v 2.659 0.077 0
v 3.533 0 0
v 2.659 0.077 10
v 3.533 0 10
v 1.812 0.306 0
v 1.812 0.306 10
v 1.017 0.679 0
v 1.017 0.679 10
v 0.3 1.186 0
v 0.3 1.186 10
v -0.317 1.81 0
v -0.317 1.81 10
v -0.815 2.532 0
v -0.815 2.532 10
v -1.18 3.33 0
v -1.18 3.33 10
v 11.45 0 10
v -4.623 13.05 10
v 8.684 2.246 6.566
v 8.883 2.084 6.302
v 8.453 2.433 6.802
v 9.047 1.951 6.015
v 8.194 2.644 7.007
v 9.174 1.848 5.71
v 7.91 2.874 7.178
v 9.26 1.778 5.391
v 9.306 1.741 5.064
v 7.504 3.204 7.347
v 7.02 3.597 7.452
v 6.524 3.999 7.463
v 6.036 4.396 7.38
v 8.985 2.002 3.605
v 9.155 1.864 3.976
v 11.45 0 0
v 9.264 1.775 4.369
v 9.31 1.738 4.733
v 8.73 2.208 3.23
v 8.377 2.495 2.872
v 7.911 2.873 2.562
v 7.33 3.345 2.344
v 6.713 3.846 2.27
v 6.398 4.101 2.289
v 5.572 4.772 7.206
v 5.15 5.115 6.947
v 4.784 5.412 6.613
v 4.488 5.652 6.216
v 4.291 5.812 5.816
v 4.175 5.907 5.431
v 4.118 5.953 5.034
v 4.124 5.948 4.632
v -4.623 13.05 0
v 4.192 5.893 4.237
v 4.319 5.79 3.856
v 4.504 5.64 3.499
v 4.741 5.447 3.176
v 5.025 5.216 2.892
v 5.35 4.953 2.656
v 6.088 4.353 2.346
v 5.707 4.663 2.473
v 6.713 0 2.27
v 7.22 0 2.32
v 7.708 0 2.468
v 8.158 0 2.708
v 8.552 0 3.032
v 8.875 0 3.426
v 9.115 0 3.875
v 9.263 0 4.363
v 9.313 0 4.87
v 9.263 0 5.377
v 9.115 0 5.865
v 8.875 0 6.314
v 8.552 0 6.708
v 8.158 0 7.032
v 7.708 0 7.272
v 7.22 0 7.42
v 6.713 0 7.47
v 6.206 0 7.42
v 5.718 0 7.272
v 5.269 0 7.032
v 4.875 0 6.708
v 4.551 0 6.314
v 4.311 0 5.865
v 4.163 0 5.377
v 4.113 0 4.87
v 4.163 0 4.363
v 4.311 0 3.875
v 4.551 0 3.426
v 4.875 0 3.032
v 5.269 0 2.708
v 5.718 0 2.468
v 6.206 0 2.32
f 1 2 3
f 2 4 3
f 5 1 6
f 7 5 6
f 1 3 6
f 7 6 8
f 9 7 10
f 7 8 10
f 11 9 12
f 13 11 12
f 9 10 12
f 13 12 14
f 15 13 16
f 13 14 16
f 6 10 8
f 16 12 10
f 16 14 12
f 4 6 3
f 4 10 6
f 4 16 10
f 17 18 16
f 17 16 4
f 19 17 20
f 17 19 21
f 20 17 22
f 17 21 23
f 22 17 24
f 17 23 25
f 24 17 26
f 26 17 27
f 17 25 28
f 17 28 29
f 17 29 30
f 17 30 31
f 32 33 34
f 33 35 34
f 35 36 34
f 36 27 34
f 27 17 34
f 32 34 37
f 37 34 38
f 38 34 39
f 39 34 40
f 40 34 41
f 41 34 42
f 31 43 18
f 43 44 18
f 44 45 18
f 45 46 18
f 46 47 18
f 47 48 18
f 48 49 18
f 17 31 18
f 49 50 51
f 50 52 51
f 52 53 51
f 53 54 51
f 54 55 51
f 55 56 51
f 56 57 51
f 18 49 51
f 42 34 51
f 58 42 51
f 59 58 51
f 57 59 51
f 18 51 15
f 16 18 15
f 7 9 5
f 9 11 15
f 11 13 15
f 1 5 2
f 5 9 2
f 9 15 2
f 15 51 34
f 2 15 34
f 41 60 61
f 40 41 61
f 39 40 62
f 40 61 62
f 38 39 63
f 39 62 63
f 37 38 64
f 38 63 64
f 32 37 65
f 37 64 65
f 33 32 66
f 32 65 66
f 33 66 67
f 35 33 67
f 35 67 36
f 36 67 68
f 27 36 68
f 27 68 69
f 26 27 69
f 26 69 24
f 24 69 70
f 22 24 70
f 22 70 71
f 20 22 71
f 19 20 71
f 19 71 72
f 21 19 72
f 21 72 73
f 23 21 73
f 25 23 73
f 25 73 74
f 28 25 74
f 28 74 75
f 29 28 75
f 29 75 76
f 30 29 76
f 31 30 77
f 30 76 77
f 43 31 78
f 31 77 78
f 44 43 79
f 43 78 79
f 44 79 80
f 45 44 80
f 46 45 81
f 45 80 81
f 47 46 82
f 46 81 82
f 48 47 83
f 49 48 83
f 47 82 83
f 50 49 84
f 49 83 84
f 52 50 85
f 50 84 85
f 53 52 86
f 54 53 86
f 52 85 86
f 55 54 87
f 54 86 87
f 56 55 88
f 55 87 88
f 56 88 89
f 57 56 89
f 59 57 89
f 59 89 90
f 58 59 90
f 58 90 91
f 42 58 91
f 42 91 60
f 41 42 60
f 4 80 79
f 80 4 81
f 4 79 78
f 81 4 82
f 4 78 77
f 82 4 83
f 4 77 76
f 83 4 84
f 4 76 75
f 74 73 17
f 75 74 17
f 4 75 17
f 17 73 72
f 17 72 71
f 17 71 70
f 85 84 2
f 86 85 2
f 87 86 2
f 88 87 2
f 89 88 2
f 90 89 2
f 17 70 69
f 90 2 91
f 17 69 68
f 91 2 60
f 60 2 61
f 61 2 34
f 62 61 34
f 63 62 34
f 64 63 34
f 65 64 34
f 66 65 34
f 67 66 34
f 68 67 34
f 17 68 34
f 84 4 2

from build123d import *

# Parameters (mm, degrees)
BOSS_EXTRUDE1_DEPTH = 10
FILLET1_R           = 5
SKETCH4_R           = 2.6
CUT_EXTRUDE1_DEPTH  = 10


with BuildPart() as part:
    # Sketch2 → Boss-Extrude1 (new body)
    with BuildSketch(Plane.XY):
        Polygon((0, 0), (11.45, 0), (-4.62309301, 13.05), align=None)
    extrude(amount=BOSS_EXTRUDE1_DEPTH)

    # Fillet1
    fillet1_edges = [part.edges().sort_by_distance(p)[0] for p in [
        (0, 0, 5),
    ]]
    fillet(fillet1_edges, radius=FILLET1_R)

    # Sketch4 → Cut-Extrude1 (cut)
    with BuildSketch(Plane.XZ):
        with Locations(Location((6.713179585, 4.87, 0), (0, 0, 270))):
            Circle(SKETCH4_R)
    extrude(amount=-CUT_EXTRUDE1_DEPTH, mode=Mode.SUBTRACT)


solid = part.part
